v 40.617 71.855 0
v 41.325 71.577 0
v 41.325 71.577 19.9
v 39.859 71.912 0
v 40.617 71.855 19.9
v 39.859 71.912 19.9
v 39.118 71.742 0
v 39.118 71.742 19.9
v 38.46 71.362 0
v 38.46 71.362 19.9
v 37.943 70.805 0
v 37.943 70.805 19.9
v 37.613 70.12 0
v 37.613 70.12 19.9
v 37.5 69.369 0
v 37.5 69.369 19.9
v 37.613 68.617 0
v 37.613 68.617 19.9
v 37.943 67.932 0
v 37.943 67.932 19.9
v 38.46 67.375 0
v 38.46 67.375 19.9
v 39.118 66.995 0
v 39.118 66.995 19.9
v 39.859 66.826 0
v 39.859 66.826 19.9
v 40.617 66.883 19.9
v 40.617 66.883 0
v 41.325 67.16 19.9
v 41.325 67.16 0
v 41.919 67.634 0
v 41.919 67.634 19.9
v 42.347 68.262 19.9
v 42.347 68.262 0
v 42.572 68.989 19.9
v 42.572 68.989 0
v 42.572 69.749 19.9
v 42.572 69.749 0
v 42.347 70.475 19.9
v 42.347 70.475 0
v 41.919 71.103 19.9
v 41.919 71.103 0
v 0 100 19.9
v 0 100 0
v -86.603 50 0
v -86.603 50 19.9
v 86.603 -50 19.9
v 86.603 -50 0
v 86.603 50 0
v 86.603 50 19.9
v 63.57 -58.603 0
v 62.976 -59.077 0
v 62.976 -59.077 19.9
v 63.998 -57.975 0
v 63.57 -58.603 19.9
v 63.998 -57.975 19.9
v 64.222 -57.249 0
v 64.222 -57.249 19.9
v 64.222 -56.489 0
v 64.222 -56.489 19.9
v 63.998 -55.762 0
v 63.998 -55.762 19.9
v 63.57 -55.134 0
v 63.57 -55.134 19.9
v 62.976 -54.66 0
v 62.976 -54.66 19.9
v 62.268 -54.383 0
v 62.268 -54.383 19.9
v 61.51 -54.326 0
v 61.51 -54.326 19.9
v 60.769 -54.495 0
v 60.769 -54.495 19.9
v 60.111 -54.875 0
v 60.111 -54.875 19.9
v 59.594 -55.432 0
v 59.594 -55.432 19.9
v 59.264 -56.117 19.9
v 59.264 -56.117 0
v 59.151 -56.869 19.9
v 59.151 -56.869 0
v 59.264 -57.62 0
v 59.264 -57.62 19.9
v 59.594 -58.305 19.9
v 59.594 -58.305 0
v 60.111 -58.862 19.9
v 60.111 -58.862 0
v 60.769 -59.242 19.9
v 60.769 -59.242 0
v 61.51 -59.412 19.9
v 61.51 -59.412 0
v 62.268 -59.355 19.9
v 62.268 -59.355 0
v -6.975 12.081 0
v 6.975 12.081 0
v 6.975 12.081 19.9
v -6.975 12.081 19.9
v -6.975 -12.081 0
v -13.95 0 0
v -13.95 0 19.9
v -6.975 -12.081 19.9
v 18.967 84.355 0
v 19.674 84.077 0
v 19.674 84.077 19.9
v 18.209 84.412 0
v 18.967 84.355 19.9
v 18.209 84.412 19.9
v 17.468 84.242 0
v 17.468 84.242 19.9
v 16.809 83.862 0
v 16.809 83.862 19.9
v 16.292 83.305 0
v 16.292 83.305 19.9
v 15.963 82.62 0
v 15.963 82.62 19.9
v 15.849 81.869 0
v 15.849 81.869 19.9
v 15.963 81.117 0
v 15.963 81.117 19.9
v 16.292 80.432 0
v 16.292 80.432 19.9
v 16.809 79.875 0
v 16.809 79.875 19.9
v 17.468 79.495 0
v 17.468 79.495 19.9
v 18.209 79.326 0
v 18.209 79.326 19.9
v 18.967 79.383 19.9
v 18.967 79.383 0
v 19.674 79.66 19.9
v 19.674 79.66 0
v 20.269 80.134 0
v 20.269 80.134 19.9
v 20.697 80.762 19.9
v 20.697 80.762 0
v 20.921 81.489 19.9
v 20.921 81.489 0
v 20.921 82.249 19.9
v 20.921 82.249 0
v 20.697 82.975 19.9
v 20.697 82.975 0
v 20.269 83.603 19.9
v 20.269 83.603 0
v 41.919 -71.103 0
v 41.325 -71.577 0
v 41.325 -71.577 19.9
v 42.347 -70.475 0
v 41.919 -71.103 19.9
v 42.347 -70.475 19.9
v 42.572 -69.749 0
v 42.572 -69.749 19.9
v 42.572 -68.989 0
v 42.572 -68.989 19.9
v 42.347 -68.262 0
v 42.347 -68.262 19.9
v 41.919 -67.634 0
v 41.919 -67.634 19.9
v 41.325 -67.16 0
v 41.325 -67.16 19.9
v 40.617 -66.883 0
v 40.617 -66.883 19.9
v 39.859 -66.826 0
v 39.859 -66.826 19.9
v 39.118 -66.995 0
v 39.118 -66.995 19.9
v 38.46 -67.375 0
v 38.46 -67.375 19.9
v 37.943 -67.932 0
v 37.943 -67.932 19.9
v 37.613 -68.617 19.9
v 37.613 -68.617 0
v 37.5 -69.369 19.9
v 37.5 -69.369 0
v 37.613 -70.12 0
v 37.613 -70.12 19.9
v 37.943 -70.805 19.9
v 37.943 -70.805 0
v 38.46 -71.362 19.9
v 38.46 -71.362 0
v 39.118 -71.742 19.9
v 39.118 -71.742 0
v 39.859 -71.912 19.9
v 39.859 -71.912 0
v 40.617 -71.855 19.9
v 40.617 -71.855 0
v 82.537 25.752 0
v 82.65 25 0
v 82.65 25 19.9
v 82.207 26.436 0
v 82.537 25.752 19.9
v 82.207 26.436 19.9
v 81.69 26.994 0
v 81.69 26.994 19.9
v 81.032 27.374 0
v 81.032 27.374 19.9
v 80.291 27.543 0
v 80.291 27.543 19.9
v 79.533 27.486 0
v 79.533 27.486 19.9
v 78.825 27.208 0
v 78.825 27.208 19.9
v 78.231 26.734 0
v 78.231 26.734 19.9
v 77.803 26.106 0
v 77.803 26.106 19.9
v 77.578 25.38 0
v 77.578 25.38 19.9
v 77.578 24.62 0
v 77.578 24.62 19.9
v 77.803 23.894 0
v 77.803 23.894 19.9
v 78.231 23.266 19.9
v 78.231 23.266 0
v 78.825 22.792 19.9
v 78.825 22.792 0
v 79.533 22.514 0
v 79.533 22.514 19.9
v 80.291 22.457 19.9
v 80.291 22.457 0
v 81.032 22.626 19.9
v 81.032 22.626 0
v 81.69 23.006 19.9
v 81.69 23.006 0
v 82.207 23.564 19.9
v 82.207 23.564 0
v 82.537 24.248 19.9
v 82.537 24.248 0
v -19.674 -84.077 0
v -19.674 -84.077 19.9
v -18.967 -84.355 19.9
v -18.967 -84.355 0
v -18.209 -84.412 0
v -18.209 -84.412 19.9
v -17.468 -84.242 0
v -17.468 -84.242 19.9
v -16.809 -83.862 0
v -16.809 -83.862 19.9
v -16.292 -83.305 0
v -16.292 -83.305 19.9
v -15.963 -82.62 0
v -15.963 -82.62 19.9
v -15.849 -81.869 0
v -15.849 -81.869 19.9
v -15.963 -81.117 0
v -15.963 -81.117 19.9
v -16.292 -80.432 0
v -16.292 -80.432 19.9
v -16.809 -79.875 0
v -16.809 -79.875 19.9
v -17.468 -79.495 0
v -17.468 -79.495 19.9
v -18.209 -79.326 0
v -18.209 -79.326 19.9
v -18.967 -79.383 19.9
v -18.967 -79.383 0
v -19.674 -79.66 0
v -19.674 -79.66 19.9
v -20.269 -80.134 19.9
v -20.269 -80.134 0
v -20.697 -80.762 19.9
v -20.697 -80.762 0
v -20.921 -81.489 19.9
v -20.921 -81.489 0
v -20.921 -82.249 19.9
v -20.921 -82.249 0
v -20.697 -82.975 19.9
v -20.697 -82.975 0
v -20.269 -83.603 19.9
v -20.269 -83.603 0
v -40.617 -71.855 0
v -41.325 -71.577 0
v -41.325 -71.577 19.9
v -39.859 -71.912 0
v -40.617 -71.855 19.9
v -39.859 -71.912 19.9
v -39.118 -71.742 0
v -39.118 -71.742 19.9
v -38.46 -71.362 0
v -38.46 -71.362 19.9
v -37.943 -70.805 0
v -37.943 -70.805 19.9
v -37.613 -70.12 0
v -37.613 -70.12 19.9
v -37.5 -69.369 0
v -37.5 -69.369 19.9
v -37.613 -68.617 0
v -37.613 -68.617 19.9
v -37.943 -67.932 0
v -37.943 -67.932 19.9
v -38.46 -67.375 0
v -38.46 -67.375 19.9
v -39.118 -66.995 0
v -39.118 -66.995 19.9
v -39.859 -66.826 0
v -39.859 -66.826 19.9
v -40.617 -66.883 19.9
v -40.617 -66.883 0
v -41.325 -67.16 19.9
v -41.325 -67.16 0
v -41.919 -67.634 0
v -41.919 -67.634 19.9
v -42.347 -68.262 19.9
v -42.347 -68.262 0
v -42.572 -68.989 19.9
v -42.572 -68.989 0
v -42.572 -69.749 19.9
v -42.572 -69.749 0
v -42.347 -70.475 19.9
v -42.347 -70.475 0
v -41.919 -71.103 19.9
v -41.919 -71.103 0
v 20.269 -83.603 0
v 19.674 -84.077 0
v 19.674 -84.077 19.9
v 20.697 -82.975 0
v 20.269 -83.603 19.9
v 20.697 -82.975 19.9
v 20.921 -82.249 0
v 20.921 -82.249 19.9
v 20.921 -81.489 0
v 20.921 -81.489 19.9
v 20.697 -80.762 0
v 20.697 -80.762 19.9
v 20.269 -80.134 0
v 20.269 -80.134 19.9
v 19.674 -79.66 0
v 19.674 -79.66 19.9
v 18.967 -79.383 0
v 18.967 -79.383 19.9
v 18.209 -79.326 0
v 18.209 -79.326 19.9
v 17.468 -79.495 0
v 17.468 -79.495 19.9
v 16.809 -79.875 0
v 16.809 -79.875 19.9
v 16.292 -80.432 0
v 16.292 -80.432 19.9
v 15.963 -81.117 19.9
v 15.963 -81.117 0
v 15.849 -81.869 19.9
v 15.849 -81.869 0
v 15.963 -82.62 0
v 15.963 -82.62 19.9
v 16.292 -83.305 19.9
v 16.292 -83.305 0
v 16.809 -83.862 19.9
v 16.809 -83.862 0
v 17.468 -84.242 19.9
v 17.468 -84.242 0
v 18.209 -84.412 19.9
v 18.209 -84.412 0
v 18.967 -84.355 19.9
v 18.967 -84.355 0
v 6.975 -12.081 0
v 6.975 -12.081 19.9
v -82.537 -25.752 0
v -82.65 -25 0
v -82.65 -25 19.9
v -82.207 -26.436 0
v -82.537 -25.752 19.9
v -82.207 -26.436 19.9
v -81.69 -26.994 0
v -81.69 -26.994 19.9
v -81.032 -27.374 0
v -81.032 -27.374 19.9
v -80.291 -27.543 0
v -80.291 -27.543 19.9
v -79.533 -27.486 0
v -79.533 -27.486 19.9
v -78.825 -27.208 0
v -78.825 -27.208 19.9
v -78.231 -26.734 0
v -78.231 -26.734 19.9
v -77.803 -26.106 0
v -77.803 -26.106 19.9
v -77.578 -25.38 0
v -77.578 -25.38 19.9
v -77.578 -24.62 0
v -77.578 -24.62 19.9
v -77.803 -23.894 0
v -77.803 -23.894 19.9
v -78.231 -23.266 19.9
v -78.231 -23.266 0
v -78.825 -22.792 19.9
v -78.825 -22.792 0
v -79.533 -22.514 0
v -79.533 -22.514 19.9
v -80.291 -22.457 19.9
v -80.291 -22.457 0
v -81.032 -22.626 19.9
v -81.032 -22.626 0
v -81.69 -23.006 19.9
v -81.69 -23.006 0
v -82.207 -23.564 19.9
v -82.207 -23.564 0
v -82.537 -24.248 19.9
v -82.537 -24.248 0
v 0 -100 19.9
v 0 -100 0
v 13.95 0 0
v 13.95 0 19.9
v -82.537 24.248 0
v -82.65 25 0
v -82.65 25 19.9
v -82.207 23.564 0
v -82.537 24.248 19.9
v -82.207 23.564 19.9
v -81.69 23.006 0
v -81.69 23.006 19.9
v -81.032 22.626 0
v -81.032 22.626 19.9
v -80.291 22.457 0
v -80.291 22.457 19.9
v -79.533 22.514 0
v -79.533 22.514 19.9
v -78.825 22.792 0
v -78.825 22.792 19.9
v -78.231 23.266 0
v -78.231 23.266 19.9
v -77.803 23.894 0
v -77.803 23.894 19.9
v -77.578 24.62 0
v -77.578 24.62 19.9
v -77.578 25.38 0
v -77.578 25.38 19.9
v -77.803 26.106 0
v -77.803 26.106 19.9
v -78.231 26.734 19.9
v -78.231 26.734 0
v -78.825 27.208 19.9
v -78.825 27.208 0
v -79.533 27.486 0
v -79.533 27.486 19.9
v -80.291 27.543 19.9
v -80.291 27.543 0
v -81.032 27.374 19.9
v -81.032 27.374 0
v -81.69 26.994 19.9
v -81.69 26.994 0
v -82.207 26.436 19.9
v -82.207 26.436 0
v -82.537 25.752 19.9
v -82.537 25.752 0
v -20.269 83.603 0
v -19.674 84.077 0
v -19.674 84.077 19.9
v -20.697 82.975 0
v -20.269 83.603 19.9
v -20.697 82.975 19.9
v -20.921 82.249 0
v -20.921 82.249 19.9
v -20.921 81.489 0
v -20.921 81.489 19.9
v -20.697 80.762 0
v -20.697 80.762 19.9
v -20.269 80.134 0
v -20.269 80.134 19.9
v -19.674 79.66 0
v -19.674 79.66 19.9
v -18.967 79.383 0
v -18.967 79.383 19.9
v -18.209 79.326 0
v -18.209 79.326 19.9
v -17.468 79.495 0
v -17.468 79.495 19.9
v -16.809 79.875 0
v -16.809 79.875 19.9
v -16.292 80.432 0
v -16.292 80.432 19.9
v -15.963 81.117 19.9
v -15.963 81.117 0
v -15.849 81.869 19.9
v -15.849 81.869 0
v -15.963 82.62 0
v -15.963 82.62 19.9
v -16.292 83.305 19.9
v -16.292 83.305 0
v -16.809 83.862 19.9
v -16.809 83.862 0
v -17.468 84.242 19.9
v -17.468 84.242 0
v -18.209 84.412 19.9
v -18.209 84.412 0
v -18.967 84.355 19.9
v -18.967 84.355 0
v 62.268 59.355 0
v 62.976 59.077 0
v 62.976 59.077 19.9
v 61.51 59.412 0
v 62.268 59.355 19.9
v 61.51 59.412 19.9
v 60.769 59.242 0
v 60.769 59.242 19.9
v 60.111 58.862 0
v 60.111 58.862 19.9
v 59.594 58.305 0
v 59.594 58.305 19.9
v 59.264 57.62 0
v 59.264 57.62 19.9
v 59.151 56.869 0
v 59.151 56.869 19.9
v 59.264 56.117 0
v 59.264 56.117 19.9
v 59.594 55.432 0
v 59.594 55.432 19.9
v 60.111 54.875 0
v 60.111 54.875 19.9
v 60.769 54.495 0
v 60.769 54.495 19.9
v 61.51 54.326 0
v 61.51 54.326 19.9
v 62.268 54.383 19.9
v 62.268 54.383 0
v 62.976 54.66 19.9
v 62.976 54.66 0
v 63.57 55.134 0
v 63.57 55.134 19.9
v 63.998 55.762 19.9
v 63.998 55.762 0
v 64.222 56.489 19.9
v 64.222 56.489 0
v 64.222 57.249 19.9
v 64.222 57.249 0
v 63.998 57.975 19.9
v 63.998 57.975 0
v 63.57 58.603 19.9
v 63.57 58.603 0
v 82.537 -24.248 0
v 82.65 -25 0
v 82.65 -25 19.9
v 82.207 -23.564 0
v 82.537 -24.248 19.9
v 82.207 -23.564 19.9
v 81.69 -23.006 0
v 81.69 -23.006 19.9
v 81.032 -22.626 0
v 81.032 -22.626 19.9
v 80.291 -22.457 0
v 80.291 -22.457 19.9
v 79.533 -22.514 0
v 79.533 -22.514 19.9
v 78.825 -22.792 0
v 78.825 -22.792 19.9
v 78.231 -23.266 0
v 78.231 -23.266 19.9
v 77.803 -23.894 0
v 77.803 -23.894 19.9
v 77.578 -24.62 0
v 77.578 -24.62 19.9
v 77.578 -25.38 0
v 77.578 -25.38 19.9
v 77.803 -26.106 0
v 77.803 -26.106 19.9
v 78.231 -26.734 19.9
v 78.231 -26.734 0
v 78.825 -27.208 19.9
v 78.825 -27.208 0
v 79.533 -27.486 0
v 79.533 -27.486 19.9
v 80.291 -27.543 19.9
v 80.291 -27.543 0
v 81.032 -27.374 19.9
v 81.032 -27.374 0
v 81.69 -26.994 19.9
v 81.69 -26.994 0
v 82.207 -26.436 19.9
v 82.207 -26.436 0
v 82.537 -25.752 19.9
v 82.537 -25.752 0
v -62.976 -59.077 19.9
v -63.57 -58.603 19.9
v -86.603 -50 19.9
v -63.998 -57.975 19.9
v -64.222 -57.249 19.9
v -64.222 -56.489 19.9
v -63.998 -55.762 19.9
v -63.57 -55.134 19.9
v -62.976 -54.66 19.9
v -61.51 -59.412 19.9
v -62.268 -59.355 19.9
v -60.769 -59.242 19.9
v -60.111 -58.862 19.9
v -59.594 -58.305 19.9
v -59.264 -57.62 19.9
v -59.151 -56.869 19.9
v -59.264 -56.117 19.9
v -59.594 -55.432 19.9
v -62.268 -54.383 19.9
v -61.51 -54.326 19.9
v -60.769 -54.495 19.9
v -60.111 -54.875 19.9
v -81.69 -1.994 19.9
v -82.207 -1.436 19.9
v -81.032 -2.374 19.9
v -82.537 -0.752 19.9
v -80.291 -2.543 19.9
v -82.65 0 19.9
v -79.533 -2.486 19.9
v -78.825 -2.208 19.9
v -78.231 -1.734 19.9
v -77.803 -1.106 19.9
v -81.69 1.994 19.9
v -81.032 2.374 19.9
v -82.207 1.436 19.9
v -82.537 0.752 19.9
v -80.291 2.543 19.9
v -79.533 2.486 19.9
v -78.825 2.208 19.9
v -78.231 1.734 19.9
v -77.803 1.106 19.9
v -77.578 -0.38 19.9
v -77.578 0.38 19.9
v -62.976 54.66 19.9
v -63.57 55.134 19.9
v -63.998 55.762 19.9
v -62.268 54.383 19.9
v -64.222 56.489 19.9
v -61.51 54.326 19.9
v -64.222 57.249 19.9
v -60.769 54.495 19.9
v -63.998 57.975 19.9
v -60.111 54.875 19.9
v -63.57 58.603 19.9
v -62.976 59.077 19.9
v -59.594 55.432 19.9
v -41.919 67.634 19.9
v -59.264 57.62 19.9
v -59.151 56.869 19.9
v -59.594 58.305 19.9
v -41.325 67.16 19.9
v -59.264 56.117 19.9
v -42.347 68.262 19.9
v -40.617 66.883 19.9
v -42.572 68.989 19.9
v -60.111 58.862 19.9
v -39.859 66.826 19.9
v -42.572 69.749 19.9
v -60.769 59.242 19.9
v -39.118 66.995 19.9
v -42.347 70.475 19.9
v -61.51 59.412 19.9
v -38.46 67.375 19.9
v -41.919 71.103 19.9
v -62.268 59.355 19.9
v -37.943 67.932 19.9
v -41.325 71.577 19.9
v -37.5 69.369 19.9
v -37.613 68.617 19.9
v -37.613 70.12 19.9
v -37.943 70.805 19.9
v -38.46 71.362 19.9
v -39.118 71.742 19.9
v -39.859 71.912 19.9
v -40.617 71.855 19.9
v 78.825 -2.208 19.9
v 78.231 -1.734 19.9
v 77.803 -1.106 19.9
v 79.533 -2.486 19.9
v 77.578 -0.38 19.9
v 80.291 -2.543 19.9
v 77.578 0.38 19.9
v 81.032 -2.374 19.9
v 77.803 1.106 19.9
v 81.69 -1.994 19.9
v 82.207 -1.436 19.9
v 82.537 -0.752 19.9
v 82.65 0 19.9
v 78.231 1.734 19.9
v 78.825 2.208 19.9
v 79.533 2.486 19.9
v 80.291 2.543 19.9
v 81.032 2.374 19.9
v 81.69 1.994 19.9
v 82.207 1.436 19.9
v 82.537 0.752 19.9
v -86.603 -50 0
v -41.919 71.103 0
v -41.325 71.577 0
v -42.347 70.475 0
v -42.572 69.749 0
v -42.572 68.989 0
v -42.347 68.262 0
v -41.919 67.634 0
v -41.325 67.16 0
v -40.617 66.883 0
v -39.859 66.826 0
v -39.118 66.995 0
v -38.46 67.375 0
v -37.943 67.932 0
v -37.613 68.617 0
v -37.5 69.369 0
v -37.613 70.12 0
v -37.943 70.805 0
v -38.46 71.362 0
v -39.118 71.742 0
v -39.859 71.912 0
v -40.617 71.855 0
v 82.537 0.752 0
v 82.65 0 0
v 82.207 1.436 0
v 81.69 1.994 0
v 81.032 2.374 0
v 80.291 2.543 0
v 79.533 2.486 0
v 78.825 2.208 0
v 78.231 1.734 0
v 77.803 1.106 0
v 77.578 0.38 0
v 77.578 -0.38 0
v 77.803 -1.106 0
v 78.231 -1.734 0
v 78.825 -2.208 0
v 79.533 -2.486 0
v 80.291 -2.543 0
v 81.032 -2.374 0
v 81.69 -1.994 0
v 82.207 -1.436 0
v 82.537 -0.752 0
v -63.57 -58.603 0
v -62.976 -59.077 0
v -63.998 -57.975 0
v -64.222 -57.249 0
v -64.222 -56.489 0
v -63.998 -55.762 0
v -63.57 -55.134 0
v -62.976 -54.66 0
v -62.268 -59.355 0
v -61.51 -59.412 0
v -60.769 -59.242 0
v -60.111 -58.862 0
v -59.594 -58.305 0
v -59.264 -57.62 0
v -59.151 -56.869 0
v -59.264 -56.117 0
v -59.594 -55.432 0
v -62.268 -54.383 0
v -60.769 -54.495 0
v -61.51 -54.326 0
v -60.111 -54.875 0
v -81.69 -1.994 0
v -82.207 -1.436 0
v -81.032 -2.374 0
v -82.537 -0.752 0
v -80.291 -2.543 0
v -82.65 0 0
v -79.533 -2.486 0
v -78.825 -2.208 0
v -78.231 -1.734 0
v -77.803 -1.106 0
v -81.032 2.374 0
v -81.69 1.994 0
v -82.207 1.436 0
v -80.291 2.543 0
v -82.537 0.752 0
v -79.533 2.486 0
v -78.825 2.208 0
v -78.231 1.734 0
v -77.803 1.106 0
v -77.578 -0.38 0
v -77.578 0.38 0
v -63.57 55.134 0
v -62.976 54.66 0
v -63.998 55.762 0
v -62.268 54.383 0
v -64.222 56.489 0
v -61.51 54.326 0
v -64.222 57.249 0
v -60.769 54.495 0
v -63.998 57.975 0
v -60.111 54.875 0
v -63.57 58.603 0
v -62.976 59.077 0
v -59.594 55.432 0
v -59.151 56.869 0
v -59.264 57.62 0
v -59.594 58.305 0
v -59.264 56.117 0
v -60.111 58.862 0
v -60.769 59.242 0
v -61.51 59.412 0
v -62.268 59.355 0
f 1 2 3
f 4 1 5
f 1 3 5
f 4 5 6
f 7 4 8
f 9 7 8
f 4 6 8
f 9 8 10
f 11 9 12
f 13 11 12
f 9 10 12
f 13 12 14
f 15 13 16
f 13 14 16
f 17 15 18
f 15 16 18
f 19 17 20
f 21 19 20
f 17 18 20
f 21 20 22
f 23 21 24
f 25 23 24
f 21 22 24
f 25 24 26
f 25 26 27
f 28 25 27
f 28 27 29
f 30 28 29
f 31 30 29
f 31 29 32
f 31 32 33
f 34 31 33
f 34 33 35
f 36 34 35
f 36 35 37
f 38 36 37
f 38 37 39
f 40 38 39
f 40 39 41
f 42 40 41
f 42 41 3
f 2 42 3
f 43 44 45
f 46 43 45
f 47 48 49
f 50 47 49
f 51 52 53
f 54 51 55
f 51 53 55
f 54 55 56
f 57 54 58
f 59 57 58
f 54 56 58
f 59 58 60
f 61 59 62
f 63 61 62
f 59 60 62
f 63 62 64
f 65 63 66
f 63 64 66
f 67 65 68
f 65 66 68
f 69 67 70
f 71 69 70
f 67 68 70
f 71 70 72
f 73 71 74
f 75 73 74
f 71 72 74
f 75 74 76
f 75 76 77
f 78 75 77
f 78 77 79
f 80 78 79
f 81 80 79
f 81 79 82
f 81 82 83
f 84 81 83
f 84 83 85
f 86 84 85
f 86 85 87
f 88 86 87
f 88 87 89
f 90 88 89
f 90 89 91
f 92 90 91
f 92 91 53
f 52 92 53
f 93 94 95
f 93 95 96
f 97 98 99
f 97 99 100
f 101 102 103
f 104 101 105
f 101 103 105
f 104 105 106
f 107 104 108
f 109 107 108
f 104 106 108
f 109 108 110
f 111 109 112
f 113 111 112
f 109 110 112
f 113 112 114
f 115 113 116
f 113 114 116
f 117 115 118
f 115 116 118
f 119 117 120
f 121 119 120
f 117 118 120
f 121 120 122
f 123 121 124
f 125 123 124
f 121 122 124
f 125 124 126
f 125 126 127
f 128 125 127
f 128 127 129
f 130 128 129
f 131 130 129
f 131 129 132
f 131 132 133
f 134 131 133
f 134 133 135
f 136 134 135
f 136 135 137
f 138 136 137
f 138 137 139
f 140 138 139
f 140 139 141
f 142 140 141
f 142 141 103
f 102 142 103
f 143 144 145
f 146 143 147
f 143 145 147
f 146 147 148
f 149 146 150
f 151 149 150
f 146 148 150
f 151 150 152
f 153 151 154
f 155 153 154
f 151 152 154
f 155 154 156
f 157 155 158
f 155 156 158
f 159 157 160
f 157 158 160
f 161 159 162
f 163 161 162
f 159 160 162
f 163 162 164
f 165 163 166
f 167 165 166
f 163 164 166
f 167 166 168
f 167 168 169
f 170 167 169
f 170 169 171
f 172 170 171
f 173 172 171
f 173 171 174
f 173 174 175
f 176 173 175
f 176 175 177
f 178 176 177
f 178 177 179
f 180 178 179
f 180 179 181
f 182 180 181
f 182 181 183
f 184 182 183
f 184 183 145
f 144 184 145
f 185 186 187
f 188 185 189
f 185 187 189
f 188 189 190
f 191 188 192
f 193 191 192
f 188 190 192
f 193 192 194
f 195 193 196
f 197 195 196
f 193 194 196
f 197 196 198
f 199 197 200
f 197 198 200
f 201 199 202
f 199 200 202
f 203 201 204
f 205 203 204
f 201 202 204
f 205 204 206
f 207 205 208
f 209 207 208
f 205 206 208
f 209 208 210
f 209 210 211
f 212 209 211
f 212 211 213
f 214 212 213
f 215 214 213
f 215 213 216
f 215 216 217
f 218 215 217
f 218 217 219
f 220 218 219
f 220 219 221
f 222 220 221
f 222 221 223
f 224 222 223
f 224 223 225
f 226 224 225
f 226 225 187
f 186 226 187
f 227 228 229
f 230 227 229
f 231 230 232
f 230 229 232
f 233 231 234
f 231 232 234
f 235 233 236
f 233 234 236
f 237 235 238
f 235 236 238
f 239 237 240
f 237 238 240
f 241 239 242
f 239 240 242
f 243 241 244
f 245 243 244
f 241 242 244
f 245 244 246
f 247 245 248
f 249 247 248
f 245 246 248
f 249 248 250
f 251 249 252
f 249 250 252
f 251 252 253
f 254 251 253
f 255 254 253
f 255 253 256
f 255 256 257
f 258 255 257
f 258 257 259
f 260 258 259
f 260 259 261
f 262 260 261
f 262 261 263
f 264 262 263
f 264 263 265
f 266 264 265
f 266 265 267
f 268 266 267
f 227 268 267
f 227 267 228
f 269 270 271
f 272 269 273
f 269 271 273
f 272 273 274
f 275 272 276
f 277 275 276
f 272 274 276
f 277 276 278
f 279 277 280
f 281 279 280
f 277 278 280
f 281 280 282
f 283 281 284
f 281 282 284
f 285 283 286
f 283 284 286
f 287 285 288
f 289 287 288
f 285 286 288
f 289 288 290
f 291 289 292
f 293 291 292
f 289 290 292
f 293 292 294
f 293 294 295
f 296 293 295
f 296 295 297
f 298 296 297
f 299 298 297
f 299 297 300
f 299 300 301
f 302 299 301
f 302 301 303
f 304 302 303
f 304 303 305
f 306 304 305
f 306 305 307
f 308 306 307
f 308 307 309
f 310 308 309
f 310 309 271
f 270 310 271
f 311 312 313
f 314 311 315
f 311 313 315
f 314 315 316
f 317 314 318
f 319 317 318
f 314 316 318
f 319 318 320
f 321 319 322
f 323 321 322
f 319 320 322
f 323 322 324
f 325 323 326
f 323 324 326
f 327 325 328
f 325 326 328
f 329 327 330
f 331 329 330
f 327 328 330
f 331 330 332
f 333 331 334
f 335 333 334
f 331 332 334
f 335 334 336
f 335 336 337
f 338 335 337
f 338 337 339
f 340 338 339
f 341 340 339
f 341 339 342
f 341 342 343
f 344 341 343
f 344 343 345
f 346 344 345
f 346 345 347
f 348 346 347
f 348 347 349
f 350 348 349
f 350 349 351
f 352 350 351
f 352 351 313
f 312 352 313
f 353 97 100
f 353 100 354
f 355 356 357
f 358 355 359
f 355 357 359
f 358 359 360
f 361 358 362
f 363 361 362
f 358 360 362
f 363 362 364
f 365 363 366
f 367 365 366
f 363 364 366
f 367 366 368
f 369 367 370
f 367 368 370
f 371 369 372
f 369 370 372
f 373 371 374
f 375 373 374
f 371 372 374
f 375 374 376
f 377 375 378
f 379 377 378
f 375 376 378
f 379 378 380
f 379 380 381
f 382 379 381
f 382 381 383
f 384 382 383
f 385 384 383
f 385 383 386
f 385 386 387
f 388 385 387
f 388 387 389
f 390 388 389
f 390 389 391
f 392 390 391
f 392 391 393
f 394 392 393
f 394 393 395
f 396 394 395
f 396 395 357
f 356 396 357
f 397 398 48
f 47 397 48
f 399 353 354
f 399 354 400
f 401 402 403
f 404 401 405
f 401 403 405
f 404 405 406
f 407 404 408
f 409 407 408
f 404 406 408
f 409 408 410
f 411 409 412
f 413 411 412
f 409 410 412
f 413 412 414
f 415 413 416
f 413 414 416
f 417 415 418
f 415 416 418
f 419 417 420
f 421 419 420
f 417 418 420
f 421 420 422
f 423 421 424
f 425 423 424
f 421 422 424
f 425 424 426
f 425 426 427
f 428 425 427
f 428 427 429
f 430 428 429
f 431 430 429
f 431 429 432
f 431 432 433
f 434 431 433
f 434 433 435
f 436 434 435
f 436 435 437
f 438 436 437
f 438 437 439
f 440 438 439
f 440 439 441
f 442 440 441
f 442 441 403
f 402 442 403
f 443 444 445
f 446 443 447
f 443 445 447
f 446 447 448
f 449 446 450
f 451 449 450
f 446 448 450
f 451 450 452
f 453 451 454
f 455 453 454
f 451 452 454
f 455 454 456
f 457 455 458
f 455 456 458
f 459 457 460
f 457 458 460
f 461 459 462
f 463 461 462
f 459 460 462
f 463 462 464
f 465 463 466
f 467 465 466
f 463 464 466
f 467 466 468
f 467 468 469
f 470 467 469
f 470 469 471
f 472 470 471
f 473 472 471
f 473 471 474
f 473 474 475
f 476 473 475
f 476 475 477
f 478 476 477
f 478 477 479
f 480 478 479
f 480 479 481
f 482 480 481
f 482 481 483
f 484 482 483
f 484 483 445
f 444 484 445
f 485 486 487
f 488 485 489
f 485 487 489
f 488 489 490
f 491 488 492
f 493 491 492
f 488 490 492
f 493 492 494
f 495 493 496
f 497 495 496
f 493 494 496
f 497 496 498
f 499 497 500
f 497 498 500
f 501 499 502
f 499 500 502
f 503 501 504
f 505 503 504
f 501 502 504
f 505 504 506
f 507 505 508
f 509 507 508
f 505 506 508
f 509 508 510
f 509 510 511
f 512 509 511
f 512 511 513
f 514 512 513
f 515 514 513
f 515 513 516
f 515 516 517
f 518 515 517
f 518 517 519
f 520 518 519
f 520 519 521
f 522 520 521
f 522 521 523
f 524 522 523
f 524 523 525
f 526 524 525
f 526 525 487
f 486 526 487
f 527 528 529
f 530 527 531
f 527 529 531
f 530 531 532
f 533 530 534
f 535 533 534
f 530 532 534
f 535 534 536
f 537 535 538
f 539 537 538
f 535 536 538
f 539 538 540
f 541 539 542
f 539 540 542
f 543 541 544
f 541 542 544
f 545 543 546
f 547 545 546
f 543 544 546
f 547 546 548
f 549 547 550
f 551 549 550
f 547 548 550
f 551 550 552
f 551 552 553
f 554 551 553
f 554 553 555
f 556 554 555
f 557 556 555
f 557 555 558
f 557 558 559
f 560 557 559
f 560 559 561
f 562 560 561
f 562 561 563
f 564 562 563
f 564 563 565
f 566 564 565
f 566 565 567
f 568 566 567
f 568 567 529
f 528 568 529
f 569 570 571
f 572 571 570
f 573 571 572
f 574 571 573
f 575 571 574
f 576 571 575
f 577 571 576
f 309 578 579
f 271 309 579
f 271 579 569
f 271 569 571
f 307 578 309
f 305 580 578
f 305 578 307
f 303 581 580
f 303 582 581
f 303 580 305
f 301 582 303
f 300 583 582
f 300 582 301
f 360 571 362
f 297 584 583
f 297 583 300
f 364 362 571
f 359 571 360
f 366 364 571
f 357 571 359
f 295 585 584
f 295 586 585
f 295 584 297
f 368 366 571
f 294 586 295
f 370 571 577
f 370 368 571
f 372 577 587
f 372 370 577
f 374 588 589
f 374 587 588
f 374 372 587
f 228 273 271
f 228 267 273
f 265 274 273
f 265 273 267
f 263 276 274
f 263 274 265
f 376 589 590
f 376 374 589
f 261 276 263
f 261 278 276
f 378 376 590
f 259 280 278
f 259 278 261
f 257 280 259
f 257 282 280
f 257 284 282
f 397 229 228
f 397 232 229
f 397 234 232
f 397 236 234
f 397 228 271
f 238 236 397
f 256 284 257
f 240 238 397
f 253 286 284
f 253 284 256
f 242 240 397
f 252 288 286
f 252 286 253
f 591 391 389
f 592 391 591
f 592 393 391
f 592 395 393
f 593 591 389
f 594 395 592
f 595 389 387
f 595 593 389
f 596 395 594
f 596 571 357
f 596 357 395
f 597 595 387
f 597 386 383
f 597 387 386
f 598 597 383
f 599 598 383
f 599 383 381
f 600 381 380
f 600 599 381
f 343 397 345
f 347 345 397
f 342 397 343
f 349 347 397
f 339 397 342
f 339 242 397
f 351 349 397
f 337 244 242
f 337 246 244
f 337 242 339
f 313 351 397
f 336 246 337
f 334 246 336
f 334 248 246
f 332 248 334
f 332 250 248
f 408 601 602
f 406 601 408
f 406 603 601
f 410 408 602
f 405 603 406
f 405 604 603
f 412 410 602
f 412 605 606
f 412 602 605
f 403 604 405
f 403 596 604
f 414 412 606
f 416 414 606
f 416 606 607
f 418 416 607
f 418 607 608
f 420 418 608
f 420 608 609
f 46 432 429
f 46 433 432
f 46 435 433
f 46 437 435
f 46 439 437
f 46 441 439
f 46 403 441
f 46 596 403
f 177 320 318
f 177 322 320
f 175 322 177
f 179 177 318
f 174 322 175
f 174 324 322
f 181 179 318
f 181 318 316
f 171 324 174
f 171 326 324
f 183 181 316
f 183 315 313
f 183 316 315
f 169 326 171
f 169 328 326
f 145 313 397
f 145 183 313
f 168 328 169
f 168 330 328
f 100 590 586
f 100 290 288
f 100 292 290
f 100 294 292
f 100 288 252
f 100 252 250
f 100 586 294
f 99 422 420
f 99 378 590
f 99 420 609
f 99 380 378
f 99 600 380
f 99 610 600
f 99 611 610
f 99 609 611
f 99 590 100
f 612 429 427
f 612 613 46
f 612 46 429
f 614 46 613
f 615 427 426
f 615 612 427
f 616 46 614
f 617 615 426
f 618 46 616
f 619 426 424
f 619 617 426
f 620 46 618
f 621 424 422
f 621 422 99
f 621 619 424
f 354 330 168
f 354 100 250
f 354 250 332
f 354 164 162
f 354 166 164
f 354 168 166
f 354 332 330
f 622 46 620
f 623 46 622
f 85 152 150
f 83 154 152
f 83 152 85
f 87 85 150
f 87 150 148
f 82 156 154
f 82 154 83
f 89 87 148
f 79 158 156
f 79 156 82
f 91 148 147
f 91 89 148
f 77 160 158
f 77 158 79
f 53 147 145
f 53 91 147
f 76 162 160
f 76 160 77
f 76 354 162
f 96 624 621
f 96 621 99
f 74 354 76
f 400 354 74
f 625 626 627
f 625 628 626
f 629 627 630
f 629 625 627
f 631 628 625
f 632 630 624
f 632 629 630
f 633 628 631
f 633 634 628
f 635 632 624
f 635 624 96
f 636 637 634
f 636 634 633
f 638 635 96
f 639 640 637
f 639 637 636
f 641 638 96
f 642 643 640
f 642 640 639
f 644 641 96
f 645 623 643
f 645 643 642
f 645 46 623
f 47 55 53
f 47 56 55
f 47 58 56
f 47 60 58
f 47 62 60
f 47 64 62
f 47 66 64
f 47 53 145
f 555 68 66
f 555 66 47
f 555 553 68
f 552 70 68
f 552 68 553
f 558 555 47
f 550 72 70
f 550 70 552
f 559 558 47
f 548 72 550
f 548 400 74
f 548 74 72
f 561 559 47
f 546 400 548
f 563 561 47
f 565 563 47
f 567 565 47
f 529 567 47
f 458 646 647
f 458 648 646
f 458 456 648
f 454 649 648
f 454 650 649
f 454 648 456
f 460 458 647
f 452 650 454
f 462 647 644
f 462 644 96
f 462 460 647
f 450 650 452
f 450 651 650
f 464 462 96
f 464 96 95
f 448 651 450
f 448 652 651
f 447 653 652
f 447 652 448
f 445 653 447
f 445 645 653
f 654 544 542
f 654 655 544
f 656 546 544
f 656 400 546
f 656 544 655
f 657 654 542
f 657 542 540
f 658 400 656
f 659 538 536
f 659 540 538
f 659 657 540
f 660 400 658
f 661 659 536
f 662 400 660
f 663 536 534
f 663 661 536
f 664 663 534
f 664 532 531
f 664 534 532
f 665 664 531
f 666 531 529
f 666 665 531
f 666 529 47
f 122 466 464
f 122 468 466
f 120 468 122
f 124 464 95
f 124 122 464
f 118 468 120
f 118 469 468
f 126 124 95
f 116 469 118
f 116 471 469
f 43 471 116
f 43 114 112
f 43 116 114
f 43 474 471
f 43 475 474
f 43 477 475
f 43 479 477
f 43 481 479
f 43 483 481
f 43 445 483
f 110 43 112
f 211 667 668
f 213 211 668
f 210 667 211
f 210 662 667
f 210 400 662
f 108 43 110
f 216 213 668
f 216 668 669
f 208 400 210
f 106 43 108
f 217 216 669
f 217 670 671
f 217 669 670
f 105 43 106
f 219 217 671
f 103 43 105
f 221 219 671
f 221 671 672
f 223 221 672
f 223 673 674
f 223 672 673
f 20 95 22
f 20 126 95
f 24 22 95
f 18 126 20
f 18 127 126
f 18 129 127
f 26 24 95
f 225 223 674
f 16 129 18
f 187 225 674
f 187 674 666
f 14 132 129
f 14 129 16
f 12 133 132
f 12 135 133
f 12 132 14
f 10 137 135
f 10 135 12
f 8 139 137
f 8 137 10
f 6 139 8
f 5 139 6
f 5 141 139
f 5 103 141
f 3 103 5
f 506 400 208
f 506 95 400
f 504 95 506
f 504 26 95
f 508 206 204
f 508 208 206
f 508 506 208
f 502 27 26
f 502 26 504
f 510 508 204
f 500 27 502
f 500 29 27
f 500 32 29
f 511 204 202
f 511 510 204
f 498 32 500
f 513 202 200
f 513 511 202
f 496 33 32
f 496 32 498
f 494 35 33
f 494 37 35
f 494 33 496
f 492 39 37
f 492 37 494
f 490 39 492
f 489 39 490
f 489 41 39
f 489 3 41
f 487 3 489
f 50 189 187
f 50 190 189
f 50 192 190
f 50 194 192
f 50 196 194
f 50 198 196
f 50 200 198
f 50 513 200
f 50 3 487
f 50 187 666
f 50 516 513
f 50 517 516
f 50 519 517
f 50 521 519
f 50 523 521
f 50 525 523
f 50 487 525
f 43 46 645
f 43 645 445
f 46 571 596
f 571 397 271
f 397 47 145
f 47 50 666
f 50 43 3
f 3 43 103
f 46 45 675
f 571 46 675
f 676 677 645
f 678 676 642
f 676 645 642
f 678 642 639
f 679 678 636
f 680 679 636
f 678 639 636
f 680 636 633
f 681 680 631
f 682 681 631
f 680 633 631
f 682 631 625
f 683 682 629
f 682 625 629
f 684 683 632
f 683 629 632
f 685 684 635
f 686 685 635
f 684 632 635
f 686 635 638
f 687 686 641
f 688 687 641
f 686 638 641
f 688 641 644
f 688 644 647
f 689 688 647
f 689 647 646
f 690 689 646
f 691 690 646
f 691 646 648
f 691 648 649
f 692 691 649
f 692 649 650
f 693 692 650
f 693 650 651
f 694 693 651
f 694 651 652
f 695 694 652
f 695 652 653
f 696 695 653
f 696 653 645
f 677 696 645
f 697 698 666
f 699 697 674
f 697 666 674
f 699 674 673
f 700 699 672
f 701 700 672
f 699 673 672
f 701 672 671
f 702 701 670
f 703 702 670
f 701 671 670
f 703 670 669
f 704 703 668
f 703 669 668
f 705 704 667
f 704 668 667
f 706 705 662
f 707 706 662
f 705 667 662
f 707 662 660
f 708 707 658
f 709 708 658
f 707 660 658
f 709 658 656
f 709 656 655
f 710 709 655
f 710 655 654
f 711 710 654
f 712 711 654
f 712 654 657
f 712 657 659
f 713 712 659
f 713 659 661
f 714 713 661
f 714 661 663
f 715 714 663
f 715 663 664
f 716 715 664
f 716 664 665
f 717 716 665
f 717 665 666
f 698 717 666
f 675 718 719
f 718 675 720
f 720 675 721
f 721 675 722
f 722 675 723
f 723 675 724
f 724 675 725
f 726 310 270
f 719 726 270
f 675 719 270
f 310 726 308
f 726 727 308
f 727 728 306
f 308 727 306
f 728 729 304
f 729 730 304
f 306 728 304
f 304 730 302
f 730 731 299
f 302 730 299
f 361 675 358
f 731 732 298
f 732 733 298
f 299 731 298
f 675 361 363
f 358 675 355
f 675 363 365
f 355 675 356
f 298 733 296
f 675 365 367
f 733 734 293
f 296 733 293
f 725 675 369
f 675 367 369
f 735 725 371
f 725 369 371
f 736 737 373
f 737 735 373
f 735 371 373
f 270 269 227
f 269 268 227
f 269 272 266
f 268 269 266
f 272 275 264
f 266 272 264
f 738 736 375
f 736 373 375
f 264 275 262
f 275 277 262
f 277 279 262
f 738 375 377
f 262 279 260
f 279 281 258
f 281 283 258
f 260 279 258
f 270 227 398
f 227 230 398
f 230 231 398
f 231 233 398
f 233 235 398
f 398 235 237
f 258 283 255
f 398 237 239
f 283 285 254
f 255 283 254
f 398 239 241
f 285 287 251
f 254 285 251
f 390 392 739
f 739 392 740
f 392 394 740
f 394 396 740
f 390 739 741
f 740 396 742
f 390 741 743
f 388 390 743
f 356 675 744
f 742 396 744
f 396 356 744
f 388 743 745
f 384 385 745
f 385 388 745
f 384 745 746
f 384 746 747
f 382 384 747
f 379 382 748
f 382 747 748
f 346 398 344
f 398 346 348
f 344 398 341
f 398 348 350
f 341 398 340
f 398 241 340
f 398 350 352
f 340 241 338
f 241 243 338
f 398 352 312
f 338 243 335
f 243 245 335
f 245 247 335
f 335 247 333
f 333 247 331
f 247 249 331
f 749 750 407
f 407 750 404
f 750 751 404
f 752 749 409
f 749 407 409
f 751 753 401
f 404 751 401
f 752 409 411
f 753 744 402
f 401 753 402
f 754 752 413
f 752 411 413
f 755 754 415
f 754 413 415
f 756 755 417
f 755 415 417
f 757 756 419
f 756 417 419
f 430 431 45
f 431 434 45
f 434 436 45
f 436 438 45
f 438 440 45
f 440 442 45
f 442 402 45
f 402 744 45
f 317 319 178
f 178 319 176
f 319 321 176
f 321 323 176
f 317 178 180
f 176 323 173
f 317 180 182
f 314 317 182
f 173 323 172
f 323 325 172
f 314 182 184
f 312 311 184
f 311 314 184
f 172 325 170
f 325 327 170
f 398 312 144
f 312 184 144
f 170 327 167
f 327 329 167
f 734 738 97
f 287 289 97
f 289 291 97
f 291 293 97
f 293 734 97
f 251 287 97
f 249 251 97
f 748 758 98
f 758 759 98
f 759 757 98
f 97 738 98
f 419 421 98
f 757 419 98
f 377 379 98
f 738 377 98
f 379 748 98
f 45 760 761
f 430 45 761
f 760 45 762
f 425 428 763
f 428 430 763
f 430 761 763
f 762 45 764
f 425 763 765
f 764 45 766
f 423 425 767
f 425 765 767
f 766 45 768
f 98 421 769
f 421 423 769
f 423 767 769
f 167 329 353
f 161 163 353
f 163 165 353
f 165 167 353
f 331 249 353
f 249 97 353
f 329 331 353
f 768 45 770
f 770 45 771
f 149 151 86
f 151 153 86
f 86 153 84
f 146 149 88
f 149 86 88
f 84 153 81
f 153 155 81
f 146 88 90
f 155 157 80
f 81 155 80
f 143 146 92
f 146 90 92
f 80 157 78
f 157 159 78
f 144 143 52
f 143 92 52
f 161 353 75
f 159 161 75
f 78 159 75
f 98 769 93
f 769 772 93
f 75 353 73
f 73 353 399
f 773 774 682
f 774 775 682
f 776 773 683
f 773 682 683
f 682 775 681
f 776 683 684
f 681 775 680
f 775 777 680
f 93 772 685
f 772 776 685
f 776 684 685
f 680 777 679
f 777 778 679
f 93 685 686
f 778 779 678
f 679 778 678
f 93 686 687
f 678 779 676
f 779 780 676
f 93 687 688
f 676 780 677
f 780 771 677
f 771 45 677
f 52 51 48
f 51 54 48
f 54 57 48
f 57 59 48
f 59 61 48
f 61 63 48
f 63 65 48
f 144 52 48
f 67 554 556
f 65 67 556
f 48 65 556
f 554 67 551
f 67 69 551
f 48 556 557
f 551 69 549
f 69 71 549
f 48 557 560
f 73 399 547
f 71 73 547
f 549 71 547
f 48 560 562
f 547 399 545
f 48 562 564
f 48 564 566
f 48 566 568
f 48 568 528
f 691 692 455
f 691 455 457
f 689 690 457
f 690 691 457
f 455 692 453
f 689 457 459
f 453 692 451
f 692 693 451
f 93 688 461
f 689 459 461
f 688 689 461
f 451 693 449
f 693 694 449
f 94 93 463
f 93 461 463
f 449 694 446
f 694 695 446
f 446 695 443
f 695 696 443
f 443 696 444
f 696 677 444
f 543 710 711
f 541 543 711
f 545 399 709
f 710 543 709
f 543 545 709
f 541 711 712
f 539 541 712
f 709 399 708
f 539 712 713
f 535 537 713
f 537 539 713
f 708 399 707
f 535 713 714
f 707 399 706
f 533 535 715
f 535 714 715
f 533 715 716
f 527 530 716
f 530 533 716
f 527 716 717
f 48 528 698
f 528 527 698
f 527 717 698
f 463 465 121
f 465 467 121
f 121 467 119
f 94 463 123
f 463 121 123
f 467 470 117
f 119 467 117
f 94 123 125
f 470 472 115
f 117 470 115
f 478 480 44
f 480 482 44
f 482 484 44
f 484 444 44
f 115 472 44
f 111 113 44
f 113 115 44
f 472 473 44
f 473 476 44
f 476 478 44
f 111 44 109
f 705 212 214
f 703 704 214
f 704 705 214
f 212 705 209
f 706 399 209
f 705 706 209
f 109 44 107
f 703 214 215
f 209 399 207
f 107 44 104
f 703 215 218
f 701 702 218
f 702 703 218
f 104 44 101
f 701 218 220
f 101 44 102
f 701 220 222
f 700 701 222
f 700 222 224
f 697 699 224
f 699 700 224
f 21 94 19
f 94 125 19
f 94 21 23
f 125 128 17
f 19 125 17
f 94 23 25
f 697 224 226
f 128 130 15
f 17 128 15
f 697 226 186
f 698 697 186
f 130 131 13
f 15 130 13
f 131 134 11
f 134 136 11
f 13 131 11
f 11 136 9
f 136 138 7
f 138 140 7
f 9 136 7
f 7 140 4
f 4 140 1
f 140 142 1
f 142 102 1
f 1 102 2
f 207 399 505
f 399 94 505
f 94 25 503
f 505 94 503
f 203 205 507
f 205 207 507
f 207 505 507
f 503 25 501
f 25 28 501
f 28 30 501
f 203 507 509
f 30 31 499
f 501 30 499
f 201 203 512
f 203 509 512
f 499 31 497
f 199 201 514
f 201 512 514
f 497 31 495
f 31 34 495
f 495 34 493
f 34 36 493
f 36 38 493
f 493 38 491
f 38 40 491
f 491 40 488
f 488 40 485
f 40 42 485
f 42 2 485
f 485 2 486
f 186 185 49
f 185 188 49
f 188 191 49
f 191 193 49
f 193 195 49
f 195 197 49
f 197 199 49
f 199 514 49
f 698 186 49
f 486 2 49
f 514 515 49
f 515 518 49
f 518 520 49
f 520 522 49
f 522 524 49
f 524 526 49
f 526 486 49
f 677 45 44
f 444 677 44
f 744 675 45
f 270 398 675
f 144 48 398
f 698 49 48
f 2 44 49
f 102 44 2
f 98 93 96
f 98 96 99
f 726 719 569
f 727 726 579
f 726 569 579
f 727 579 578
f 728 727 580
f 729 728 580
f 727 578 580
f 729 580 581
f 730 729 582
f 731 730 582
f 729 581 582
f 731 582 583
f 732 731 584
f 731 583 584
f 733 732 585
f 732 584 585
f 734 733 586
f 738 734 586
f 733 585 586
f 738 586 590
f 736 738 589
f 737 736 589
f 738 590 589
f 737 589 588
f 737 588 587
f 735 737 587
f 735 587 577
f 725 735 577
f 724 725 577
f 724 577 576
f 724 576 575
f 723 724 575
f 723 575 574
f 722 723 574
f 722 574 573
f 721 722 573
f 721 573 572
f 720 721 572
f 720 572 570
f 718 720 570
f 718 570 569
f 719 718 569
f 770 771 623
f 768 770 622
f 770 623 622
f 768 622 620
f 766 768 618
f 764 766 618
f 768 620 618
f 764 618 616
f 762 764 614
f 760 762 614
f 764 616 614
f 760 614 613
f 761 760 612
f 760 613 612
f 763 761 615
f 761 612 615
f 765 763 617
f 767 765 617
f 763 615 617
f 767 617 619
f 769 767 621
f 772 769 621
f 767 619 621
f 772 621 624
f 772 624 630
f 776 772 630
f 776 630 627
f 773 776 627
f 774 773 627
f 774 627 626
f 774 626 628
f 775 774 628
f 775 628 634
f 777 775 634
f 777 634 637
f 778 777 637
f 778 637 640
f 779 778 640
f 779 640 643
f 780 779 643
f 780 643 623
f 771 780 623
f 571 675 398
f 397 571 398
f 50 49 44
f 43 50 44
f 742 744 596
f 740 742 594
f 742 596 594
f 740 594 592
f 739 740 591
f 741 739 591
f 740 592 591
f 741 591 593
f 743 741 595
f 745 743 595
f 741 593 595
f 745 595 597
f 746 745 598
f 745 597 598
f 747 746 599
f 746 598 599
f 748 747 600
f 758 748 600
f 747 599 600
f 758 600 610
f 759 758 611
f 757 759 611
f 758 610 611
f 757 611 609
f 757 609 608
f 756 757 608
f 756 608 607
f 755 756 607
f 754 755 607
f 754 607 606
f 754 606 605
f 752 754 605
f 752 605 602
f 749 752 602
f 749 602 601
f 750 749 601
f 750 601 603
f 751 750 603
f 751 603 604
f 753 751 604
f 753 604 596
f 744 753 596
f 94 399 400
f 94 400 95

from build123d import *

# Parameters (mm, degrees)
PAD_DEPTH          = 19.9
SKETCH001_R        = 2.55
POCKET_DEPTH       = 550.545928
POLARPATTERN_COUNT = 6


with BuildPart() as part:
    # Sketch → Pad (new body)
    with BuildSketch(Plane.XY):
        Polygon((0, 100), (-86.60254, 50), (-86.60254, -50), (0, -100), (86.60254, -50), (86.60254, 50), align=None)
        Polygon((-13.95, 0), (-6.975, -12.081054), (6.975, -12.081054), (13.95, 0), (6.975, 12.081054), (-6.975, 12.081054), align=None, mode=Mode.SUBTRACT)
    extrude(amount=PAD_DEPTH)

    # Sketch001 (on Face14 of Pad) → Pocket (cut, through all)
    with BuildSketch(Plane.XY.offset(19.9)):
        with Locations((80.1, 25)):
            Circle(SKETCH001_R)
        with Locations((80.1, -25)):
            Circle(SKETCH001_R)
        with Locations((80.1, 0)):
            Circle(SKETCH001_R)
    pocket = extrude(amount=-POCKET_DEPTH, mode=Mode.SUBTRACT)

    # PolarPattern: Pocket ×6 about axis
    polarpattern_axis = Axis((0, 0, 19.9), (0, 0, 1))
    for i in range(1, POLARPATTERN_COUNT):
        add(pocket.rotate(polarpattern_axis, i * 360 / POLARPATTERN_COUNT), mode=Mode.SUBTRACT)


solid = part.part
